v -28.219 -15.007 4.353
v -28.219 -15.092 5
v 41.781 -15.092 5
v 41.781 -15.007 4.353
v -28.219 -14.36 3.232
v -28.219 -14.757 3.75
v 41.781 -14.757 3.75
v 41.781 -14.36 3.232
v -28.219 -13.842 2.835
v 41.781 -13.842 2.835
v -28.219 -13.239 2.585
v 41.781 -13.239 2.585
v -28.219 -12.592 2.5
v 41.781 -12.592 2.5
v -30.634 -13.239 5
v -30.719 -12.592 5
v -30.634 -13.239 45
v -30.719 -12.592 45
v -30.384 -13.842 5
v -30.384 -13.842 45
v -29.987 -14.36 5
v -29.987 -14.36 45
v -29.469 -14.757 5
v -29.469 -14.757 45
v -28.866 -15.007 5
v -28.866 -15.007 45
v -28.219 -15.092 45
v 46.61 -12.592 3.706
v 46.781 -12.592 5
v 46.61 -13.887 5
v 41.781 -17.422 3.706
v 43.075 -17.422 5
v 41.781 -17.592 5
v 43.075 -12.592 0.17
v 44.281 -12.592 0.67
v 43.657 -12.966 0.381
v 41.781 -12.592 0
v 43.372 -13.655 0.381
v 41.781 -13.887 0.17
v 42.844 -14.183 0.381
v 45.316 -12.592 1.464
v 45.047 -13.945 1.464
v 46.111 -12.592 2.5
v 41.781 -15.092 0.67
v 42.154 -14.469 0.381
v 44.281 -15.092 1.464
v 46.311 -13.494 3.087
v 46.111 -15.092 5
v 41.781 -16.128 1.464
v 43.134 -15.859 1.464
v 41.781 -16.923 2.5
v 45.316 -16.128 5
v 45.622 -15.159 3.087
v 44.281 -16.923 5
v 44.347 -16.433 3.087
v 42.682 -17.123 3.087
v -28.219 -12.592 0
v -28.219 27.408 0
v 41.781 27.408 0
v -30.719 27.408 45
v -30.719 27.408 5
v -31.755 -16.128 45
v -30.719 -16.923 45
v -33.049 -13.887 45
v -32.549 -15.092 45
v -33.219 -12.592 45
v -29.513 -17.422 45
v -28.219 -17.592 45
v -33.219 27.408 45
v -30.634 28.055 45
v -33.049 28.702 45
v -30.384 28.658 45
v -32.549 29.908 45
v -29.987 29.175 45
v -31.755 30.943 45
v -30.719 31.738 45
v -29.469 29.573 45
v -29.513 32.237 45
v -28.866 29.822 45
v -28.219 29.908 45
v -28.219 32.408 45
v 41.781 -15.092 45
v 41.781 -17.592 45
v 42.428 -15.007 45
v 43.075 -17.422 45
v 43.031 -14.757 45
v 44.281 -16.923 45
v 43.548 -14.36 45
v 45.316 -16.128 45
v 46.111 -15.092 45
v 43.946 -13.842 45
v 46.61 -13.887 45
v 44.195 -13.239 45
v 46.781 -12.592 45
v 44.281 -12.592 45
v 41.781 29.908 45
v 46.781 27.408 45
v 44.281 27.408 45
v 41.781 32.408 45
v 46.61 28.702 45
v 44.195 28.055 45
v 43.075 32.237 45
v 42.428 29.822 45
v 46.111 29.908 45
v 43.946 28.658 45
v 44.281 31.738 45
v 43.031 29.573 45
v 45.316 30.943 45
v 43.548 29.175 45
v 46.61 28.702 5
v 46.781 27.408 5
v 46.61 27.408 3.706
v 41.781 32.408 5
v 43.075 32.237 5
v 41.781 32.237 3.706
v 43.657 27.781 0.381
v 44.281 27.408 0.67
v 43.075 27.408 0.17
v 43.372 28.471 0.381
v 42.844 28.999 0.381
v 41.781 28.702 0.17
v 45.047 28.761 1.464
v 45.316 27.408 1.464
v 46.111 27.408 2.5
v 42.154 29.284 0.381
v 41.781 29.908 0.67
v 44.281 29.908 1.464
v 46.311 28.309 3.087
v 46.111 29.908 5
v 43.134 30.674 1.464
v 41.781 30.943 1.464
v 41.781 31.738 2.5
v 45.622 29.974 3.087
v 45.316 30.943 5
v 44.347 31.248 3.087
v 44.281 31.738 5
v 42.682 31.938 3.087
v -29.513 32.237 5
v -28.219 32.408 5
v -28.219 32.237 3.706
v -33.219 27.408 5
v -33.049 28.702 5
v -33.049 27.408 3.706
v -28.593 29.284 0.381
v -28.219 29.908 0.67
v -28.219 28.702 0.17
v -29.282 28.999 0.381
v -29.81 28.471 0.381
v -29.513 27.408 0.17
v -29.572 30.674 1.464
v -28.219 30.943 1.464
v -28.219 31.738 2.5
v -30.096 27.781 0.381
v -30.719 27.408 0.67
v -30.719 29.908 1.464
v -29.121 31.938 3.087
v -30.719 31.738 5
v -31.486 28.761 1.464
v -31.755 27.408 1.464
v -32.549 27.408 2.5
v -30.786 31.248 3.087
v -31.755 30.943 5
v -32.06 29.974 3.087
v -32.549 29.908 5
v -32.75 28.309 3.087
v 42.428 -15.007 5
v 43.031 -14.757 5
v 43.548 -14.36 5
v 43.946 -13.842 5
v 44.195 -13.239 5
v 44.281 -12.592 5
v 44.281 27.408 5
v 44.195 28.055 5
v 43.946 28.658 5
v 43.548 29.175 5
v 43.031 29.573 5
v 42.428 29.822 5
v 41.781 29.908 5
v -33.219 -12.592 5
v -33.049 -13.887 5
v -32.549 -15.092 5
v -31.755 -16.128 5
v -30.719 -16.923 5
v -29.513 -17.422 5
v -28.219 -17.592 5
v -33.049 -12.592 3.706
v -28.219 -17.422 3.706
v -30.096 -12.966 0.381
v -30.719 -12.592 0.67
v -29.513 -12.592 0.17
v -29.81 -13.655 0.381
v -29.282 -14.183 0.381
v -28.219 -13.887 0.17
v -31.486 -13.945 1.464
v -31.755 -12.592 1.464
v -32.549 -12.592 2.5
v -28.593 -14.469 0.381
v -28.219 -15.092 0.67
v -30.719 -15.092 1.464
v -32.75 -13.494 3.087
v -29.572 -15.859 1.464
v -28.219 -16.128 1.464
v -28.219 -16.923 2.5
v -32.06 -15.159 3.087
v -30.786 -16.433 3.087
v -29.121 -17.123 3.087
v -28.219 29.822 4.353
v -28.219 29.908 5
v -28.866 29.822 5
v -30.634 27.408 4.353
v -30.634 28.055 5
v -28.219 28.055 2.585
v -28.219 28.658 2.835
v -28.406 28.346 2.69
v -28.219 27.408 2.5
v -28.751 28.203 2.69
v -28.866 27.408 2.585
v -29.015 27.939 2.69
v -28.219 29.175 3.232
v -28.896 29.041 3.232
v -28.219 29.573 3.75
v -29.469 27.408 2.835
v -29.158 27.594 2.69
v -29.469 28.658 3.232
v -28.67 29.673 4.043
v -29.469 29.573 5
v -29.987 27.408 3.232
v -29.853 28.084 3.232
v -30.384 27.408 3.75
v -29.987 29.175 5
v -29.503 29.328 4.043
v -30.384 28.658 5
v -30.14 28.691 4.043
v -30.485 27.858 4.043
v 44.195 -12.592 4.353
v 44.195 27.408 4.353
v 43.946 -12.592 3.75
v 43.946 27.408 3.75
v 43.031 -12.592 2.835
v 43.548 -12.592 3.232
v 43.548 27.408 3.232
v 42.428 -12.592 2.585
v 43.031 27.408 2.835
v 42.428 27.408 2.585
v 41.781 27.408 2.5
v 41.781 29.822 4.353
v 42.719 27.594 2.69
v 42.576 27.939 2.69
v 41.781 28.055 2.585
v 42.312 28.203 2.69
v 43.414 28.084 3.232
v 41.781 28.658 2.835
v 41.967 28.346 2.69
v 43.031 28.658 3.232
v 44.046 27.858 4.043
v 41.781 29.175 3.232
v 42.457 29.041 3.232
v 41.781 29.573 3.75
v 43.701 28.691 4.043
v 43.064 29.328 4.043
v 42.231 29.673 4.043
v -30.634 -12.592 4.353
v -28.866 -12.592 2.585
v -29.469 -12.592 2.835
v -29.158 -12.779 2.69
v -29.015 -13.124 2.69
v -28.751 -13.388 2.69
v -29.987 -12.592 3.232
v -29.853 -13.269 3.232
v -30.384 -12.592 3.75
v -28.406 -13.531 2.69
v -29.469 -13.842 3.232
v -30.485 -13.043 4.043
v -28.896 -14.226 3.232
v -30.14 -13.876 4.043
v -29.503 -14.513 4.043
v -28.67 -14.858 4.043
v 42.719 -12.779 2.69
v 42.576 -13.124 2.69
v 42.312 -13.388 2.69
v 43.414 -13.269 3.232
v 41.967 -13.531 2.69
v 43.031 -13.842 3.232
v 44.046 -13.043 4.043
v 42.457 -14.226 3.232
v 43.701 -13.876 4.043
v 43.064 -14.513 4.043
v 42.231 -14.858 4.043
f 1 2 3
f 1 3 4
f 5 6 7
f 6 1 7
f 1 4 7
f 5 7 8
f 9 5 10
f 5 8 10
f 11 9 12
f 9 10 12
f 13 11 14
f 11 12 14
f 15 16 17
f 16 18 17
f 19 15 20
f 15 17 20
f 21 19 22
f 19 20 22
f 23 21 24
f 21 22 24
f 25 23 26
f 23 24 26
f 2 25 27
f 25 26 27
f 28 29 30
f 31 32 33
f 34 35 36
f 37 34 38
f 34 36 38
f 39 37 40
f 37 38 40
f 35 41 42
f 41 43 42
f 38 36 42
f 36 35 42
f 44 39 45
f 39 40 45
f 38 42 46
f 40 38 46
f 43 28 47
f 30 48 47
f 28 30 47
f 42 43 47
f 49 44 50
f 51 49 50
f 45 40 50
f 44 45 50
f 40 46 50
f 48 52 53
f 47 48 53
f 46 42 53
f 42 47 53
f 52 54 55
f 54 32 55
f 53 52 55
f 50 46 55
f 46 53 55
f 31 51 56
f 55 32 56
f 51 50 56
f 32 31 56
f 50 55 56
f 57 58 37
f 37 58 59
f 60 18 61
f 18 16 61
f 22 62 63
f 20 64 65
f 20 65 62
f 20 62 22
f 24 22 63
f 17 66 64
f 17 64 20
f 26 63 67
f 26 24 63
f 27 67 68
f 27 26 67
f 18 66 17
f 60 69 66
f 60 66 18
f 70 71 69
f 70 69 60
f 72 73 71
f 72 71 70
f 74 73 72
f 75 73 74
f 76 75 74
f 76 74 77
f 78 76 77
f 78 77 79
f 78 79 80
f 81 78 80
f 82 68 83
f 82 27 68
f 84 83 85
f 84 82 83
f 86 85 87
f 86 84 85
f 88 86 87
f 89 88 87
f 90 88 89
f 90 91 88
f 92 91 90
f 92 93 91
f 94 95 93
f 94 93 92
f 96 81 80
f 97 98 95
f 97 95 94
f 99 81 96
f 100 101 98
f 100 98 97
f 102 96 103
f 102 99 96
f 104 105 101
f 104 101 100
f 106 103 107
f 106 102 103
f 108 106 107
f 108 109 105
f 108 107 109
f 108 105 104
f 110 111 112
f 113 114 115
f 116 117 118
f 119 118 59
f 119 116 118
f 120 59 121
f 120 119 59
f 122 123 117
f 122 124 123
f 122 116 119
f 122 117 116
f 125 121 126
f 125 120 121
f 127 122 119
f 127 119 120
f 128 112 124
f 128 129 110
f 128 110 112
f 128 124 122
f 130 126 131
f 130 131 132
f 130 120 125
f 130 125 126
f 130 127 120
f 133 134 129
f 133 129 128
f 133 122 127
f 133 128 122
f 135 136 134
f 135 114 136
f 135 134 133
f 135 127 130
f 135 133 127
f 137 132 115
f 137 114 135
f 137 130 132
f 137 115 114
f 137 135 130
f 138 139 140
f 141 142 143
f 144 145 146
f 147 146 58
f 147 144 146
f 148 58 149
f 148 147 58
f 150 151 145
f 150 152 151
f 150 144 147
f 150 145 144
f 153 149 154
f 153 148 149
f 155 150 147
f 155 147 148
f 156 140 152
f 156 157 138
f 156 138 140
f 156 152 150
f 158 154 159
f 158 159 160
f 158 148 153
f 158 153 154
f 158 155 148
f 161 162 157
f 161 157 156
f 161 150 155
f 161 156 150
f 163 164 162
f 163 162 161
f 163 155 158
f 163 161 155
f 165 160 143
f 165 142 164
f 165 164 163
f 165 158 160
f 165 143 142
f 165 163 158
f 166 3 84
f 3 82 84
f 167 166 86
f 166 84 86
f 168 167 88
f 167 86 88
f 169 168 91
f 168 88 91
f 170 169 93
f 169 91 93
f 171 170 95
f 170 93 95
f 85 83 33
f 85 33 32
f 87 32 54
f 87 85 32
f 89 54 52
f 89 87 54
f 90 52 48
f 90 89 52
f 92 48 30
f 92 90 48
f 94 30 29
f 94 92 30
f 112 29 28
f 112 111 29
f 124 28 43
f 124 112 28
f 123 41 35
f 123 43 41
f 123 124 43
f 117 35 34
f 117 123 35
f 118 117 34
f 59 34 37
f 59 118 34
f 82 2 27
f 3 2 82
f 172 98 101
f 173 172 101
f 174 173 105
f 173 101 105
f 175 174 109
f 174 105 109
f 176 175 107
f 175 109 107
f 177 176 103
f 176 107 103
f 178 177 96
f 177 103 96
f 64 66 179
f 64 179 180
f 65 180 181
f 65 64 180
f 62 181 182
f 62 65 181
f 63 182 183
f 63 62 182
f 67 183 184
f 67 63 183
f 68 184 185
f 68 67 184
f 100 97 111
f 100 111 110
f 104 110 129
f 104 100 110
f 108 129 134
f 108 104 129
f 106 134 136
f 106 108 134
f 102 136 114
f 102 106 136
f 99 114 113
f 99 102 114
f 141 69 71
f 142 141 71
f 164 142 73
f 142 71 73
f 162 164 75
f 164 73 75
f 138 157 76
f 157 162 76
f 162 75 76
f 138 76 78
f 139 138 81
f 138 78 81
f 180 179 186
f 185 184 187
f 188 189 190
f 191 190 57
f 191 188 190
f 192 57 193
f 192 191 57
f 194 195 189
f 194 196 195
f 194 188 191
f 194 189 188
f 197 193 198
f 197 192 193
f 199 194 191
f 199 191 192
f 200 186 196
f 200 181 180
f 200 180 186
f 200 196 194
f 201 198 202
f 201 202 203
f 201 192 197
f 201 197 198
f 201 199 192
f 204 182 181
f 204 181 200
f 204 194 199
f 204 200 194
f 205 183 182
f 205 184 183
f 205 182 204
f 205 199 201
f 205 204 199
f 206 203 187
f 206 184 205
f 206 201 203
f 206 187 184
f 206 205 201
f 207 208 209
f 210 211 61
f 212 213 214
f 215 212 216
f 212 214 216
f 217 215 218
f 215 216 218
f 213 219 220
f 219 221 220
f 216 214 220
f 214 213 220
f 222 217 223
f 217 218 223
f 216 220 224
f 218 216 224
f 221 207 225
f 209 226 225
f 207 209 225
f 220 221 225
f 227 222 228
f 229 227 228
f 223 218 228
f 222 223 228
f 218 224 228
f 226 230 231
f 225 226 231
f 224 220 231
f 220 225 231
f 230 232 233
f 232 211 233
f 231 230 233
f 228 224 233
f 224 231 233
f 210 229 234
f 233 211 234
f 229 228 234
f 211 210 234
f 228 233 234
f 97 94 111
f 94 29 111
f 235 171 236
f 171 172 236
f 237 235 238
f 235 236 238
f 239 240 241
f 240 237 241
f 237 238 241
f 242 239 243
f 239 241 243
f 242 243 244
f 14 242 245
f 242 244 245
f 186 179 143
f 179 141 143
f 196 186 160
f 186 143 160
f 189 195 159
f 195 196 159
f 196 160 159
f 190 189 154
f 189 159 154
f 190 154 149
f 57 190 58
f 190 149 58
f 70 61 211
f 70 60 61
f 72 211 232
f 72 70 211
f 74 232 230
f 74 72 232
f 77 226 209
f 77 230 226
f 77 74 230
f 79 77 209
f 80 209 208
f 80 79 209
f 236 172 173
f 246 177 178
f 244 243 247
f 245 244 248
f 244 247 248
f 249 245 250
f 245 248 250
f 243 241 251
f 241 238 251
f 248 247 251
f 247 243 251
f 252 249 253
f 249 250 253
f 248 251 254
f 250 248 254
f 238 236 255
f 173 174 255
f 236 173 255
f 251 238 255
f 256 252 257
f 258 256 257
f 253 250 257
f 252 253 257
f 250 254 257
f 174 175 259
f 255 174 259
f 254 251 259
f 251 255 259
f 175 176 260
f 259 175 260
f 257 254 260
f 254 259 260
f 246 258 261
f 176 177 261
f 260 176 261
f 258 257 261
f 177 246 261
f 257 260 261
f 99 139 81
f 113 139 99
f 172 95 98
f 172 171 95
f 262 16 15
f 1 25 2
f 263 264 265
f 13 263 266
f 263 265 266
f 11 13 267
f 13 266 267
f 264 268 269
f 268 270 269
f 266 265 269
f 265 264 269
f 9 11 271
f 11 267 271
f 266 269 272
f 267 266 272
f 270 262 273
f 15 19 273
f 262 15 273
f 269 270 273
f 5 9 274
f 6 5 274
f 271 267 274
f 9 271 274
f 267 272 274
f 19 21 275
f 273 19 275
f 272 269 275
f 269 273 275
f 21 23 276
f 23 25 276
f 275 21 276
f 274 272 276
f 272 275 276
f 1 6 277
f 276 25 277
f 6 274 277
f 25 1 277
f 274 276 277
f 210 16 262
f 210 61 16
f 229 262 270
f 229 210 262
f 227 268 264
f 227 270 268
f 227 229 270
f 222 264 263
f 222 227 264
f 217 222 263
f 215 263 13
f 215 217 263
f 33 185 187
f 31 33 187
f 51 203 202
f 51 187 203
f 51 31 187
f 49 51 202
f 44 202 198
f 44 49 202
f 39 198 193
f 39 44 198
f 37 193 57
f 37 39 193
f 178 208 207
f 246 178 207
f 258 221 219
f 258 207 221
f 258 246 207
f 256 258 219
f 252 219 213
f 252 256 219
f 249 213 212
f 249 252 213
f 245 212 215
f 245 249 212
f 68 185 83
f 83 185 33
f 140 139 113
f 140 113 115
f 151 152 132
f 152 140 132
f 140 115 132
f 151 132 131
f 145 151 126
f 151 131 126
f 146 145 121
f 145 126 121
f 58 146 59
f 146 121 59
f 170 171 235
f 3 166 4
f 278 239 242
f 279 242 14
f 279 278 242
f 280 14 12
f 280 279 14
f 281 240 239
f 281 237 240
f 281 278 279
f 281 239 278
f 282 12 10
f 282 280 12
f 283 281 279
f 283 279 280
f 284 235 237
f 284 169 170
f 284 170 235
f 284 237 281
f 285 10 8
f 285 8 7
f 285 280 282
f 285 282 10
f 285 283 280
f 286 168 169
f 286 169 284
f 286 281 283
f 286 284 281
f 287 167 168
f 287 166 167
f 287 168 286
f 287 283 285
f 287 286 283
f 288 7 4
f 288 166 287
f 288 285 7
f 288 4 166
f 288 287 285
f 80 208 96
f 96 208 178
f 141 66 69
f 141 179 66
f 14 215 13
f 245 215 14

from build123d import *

# Parameters (mm, degrees)
F0_W     = 80
F0_H     = 50
F1_DEPTH = 45
F2_R     = 5
F3_T     = -2.5


with BuildPart() as f1:
    # F0 (on Top) → F1 (new body)
    with BuildSketch(Plane.XY):
        with Locations((6.780662, 7.407585)):
            Rectangle(F0_W, F0_H)
    extrude(amount=F1_DEPTH)

    # F2
    f2_edges = [f1.edges().sort_by_distance(p)[0] for p in [
        (-33.219338, -17.592415, 22.5),
        (46.780662, -17.592415, 22.5),
        (46.780662, 32.407585, 22.5),
        (-33.219338, 32.407585, 22.5),
        (46.780662, 7.407585, 0),
        (6.780662, 32.407585, 0),
        (-33.219338, 7.407585, 0),
        (6.780662, -17.592415, 0),
    ]]
    fillet(f2_edges, radius=F2_R)

    # F3
    f3_openings = [f1.faces().sort_by_distance(p)[0] for p in [
        (6.780662, 7.407585, 45),
    ]]
    offset(amount=F3_T, openings=f3_openings)


solid = f1.part
